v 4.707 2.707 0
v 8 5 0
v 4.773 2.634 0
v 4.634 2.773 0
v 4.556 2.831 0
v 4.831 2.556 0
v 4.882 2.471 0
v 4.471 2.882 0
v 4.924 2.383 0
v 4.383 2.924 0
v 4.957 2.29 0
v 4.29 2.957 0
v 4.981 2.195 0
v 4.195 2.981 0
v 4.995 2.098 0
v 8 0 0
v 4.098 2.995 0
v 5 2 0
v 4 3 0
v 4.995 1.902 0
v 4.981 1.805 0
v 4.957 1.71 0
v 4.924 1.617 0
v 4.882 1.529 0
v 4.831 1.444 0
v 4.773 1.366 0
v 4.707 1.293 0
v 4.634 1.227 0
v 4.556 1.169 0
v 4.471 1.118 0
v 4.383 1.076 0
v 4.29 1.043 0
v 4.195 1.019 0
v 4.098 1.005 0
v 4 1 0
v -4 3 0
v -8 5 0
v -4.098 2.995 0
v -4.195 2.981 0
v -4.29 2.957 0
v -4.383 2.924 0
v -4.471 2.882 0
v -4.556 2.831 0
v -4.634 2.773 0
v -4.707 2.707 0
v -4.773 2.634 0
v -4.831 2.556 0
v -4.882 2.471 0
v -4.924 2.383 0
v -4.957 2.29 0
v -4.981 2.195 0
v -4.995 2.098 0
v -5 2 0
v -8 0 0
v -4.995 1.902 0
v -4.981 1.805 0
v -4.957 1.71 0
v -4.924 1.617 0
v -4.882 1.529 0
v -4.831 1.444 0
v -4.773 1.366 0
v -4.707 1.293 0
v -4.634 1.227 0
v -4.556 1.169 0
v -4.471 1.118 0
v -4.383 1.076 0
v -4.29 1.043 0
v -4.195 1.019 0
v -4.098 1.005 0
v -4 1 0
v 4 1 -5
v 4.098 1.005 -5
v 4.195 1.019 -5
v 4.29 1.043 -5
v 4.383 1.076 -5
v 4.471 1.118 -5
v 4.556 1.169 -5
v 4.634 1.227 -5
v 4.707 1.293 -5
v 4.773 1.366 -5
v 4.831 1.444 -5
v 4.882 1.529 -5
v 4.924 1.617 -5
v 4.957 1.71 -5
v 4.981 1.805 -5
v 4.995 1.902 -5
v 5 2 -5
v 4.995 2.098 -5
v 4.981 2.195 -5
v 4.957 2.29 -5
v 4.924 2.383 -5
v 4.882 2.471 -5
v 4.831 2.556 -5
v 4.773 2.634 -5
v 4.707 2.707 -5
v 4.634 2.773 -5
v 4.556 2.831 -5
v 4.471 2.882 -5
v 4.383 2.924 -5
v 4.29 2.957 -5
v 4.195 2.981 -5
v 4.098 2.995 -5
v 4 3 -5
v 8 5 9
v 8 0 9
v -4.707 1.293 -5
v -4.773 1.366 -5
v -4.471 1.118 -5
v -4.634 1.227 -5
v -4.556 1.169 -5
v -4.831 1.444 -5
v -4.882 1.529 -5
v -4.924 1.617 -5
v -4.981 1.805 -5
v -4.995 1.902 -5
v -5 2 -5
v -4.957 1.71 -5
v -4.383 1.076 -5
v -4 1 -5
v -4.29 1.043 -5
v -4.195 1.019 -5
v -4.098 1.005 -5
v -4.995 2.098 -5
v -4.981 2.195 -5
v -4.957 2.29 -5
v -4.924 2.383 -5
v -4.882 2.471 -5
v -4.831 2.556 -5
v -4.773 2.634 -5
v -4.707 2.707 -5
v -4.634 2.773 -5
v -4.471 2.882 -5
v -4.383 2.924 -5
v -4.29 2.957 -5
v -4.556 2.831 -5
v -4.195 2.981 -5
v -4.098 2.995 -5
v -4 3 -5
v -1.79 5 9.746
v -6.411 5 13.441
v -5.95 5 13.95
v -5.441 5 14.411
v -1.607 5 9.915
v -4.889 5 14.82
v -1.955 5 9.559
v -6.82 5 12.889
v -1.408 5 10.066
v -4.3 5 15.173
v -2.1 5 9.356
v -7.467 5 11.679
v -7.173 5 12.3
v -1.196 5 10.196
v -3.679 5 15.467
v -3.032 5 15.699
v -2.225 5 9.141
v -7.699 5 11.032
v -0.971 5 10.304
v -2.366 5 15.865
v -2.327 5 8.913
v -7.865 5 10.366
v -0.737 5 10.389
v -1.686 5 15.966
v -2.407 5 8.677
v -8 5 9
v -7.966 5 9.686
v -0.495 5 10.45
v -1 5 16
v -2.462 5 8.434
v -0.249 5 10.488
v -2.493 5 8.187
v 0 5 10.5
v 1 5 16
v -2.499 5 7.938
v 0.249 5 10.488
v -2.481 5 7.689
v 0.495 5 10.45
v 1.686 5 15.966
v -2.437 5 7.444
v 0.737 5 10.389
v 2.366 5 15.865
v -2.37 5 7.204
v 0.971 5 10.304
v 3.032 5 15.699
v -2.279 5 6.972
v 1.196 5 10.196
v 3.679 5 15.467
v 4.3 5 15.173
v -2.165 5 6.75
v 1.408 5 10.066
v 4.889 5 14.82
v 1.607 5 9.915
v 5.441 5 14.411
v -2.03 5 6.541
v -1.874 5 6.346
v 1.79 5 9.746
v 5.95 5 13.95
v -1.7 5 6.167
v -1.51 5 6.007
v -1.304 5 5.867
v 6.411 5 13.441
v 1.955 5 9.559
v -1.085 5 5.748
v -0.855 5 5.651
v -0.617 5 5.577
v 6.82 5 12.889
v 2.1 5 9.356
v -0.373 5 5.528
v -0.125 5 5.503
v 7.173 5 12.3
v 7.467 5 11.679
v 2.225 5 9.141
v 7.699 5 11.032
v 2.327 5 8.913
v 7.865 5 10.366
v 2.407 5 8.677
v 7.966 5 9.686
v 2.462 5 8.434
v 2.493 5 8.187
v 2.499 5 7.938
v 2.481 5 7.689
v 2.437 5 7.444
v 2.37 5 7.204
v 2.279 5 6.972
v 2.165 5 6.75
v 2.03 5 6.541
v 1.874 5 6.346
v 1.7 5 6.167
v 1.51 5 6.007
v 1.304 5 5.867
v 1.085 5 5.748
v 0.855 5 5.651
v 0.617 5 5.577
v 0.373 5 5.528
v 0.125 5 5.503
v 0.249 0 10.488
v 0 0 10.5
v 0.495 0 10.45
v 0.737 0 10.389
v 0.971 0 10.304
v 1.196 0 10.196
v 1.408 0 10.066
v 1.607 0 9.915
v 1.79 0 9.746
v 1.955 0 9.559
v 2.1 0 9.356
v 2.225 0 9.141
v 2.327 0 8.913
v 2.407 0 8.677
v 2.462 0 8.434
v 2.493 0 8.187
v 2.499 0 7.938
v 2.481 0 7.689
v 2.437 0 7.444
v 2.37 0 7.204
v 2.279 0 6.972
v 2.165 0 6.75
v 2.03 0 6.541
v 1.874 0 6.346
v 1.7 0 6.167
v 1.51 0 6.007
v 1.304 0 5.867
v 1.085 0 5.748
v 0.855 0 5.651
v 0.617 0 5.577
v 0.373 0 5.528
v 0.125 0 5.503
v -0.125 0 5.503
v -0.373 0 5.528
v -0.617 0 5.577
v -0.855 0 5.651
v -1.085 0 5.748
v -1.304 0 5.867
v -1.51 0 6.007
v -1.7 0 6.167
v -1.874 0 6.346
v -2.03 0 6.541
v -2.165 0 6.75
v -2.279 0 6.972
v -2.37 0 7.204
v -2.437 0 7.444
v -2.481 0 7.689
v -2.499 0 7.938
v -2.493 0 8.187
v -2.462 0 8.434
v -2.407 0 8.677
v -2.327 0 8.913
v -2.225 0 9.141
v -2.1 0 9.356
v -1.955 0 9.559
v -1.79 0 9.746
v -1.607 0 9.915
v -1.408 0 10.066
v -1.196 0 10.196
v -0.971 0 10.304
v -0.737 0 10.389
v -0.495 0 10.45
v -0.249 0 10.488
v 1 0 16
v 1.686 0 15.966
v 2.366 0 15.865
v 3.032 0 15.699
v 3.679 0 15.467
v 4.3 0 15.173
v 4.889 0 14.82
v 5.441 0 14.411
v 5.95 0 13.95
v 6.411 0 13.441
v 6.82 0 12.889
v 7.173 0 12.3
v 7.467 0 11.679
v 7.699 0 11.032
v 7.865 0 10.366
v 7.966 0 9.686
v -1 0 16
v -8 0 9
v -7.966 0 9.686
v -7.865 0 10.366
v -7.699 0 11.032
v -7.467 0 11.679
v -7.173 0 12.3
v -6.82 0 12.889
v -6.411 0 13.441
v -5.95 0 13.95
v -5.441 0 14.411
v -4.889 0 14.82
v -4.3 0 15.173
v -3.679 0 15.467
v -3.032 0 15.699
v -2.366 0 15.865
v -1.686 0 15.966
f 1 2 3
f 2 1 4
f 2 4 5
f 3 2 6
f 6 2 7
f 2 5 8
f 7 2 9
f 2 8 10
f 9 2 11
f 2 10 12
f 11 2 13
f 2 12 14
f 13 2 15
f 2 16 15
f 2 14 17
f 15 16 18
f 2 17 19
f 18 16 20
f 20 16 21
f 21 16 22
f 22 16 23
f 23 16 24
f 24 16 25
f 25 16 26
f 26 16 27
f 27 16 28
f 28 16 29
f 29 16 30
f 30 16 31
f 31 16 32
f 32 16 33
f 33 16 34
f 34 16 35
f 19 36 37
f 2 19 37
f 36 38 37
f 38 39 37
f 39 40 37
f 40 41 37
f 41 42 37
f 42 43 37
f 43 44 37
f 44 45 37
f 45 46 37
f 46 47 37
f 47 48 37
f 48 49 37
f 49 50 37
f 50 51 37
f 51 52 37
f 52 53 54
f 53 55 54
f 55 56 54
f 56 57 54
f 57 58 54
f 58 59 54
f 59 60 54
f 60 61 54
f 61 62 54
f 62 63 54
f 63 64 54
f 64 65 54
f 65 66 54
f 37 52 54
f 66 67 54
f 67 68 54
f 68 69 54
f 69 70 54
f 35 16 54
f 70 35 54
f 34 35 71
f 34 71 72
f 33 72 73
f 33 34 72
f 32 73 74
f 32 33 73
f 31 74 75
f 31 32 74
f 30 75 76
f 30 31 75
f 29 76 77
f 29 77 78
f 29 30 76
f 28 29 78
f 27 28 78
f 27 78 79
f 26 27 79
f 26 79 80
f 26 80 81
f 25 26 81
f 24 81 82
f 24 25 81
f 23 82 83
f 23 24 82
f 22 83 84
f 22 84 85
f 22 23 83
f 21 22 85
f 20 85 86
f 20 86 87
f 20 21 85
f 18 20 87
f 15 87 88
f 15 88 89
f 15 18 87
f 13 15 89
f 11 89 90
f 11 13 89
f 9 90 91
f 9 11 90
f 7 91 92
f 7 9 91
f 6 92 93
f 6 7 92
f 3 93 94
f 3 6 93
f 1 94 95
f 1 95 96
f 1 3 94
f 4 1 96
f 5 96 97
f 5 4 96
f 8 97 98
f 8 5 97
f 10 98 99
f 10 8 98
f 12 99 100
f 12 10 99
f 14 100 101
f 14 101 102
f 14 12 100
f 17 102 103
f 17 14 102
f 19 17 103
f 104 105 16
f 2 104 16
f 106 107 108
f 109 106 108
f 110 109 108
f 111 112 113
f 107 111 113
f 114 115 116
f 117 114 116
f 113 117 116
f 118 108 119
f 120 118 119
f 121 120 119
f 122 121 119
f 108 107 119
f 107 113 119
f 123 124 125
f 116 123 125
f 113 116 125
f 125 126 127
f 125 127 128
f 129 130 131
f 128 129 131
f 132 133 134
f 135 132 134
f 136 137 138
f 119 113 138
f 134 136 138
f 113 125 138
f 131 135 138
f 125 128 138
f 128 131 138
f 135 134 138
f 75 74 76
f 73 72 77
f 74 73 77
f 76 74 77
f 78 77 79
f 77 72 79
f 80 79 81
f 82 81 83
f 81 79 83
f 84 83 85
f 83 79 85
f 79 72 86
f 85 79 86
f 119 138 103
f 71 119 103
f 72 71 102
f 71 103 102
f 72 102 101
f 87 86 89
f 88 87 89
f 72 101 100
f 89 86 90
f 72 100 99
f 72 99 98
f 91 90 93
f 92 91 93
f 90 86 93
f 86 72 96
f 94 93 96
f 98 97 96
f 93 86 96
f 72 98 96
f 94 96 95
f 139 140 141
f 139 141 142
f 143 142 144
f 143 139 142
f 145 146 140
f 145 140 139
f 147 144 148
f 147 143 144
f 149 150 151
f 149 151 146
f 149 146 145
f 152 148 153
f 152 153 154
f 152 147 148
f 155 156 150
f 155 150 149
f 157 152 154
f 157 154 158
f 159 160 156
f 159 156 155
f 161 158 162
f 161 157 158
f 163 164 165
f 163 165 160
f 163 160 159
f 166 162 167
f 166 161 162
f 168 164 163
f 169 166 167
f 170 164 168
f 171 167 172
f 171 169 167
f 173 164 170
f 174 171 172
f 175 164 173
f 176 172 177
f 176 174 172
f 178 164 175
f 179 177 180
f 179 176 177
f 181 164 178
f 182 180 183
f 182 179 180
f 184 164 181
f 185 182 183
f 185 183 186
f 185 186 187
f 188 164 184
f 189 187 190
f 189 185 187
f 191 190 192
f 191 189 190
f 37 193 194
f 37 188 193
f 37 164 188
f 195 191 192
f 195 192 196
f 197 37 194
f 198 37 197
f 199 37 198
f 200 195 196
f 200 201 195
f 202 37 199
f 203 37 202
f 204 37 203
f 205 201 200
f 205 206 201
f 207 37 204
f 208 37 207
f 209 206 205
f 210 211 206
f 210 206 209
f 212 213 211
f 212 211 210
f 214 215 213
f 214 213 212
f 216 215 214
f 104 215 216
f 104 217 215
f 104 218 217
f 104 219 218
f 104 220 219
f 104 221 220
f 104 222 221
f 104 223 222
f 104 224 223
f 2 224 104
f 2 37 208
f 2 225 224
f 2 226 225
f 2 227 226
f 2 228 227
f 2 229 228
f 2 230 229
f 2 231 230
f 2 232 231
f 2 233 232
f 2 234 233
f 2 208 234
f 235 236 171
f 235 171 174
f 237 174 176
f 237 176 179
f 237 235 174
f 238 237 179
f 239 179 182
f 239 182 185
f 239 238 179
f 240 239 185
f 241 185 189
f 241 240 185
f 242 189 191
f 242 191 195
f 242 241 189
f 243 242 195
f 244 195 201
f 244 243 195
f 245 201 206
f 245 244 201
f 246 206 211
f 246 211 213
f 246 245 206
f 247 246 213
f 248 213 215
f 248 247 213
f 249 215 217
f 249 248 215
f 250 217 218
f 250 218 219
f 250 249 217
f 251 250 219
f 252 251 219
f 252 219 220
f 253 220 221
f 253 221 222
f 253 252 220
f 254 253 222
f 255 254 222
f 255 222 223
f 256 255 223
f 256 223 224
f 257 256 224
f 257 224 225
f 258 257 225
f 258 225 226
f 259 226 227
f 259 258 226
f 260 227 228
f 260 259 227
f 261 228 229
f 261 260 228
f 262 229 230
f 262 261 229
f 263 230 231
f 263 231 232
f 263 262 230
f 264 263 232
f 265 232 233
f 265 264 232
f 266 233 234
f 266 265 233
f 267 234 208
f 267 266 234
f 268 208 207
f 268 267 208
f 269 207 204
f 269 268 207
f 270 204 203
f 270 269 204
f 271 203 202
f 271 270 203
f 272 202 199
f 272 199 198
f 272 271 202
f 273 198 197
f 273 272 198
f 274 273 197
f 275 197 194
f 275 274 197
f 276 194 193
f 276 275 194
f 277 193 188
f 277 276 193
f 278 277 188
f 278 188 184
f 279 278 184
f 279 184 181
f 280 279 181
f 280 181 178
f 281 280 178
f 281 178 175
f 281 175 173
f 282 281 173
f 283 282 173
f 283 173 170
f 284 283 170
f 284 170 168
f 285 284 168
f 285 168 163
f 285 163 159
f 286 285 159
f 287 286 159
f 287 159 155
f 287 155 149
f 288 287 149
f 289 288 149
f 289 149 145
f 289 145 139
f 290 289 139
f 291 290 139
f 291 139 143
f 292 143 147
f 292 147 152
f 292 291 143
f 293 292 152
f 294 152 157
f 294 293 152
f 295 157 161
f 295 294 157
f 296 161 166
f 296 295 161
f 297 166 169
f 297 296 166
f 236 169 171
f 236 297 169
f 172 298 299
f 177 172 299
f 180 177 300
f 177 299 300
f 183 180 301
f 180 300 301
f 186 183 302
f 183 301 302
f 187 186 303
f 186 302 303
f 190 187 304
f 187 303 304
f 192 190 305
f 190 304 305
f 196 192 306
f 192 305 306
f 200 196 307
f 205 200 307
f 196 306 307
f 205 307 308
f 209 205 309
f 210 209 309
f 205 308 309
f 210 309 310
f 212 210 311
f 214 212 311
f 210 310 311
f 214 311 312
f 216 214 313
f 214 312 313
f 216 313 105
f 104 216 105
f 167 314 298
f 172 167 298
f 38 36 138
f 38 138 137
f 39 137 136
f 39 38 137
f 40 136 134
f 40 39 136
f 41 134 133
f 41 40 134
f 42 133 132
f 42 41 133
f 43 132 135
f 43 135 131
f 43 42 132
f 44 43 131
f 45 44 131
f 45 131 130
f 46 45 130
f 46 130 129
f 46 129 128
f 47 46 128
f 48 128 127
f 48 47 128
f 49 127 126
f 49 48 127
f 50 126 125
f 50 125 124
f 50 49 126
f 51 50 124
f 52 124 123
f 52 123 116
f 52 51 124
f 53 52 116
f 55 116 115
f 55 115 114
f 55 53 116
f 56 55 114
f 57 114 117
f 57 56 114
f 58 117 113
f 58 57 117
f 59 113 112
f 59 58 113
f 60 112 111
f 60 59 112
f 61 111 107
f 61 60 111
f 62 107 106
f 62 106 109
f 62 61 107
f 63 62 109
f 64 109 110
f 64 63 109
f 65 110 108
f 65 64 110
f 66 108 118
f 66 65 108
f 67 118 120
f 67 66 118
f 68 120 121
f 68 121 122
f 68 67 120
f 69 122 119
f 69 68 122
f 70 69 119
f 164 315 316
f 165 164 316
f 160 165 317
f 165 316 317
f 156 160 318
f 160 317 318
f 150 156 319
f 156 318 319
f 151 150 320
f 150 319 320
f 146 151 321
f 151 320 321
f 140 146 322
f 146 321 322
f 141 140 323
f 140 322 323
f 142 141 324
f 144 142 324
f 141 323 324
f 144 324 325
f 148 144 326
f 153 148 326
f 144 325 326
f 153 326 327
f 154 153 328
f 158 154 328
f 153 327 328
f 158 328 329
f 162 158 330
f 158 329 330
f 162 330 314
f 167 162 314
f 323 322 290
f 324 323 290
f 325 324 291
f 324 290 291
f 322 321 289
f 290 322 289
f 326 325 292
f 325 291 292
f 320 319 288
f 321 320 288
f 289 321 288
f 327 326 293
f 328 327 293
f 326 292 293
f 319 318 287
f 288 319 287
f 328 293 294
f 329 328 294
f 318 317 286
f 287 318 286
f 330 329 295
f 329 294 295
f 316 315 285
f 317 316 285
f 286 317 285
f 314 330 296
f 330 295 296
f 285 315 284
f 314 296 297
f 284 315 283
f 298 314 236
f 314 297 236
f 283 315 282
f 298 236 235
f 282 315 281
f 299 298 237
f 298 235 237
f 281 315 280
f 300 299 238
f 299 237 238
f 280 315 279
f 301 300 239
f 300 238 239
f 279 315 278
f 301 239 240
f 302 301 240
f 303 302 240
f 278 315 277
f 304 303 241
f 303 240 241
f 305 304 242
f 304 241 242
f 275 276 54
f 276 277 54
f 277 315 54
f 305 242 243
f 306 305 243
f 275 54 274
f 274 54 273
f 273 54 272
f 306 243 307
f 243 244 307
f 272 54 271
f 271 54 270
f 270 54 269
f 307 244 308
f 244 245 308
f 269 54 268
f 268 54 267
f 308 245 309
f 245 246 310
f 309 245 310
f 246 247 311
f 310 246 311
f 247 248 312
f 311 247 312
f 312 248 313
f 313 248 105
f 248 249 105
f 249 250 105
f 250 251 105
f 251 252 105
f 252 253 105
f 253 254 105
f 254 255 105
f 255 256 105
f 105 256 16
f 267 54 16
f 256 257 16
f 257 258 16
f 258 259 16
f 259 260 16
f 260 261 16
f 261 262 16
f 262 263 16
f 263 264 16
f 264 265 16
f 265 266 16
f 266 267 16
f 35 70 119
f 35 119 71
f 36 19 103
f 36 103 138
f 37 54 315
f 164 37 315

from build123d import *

# Parameters (mm, degrees)
SKETCH1_R           = 2.5
BOSS_EXTRUDE1_DEPTH = 5
BOSS_EXTRUDE2_DEPTH = 5


with BuildPart() as part:
    # Sketch1 → Boss-Extrude1 (new body)
    with BuildSketch(Plane(origin=(0, 0, 0), x_dir=(1, 0, 0), z_dir=(0, 1, 0))):
        with BuildLine():
            Line((-8, 0), (-8, -9))
            ThreePointArc((-8, -9), (-5.949747468, -13.949747468), (-1, -16))
            Line((-1, -16), (1, -16))
            ThreePointArc((1, -16), (5.949747468, -13.949747468), (8, -9))
            Line((8, -9), (8, 0))
            Line((8, 0), (-8, 0))
        make_face()
        with Locations(Location((0, -8, 0), (0, 0, 270))):
            Circle(SKETCH1_R, mode=Mode.SUBTRACT)
    extrude(amount=BOSS_EXTRUDE1_DEPTH)

    # Sketch2 → Boss-Extrude2 (add)
    with BuildSketch(Plane(origin=(0, 0, 0), x_dir=(-1, 0, 0), z_dir=(0, 0, -1))):
        with BuildLine():
            Line((-4, 3), (4, 3))
            ThreePointArc((4, 3), (5, 2), (4, 1))
            Line((4, 1), (-4, 1))
            ThreePointArc((-4, 1), (-5, 2), (-4, 3))
        make_face()
    extrude(amount=BOSS_EXTRUDE2_DEPTH)


solid = part.part
